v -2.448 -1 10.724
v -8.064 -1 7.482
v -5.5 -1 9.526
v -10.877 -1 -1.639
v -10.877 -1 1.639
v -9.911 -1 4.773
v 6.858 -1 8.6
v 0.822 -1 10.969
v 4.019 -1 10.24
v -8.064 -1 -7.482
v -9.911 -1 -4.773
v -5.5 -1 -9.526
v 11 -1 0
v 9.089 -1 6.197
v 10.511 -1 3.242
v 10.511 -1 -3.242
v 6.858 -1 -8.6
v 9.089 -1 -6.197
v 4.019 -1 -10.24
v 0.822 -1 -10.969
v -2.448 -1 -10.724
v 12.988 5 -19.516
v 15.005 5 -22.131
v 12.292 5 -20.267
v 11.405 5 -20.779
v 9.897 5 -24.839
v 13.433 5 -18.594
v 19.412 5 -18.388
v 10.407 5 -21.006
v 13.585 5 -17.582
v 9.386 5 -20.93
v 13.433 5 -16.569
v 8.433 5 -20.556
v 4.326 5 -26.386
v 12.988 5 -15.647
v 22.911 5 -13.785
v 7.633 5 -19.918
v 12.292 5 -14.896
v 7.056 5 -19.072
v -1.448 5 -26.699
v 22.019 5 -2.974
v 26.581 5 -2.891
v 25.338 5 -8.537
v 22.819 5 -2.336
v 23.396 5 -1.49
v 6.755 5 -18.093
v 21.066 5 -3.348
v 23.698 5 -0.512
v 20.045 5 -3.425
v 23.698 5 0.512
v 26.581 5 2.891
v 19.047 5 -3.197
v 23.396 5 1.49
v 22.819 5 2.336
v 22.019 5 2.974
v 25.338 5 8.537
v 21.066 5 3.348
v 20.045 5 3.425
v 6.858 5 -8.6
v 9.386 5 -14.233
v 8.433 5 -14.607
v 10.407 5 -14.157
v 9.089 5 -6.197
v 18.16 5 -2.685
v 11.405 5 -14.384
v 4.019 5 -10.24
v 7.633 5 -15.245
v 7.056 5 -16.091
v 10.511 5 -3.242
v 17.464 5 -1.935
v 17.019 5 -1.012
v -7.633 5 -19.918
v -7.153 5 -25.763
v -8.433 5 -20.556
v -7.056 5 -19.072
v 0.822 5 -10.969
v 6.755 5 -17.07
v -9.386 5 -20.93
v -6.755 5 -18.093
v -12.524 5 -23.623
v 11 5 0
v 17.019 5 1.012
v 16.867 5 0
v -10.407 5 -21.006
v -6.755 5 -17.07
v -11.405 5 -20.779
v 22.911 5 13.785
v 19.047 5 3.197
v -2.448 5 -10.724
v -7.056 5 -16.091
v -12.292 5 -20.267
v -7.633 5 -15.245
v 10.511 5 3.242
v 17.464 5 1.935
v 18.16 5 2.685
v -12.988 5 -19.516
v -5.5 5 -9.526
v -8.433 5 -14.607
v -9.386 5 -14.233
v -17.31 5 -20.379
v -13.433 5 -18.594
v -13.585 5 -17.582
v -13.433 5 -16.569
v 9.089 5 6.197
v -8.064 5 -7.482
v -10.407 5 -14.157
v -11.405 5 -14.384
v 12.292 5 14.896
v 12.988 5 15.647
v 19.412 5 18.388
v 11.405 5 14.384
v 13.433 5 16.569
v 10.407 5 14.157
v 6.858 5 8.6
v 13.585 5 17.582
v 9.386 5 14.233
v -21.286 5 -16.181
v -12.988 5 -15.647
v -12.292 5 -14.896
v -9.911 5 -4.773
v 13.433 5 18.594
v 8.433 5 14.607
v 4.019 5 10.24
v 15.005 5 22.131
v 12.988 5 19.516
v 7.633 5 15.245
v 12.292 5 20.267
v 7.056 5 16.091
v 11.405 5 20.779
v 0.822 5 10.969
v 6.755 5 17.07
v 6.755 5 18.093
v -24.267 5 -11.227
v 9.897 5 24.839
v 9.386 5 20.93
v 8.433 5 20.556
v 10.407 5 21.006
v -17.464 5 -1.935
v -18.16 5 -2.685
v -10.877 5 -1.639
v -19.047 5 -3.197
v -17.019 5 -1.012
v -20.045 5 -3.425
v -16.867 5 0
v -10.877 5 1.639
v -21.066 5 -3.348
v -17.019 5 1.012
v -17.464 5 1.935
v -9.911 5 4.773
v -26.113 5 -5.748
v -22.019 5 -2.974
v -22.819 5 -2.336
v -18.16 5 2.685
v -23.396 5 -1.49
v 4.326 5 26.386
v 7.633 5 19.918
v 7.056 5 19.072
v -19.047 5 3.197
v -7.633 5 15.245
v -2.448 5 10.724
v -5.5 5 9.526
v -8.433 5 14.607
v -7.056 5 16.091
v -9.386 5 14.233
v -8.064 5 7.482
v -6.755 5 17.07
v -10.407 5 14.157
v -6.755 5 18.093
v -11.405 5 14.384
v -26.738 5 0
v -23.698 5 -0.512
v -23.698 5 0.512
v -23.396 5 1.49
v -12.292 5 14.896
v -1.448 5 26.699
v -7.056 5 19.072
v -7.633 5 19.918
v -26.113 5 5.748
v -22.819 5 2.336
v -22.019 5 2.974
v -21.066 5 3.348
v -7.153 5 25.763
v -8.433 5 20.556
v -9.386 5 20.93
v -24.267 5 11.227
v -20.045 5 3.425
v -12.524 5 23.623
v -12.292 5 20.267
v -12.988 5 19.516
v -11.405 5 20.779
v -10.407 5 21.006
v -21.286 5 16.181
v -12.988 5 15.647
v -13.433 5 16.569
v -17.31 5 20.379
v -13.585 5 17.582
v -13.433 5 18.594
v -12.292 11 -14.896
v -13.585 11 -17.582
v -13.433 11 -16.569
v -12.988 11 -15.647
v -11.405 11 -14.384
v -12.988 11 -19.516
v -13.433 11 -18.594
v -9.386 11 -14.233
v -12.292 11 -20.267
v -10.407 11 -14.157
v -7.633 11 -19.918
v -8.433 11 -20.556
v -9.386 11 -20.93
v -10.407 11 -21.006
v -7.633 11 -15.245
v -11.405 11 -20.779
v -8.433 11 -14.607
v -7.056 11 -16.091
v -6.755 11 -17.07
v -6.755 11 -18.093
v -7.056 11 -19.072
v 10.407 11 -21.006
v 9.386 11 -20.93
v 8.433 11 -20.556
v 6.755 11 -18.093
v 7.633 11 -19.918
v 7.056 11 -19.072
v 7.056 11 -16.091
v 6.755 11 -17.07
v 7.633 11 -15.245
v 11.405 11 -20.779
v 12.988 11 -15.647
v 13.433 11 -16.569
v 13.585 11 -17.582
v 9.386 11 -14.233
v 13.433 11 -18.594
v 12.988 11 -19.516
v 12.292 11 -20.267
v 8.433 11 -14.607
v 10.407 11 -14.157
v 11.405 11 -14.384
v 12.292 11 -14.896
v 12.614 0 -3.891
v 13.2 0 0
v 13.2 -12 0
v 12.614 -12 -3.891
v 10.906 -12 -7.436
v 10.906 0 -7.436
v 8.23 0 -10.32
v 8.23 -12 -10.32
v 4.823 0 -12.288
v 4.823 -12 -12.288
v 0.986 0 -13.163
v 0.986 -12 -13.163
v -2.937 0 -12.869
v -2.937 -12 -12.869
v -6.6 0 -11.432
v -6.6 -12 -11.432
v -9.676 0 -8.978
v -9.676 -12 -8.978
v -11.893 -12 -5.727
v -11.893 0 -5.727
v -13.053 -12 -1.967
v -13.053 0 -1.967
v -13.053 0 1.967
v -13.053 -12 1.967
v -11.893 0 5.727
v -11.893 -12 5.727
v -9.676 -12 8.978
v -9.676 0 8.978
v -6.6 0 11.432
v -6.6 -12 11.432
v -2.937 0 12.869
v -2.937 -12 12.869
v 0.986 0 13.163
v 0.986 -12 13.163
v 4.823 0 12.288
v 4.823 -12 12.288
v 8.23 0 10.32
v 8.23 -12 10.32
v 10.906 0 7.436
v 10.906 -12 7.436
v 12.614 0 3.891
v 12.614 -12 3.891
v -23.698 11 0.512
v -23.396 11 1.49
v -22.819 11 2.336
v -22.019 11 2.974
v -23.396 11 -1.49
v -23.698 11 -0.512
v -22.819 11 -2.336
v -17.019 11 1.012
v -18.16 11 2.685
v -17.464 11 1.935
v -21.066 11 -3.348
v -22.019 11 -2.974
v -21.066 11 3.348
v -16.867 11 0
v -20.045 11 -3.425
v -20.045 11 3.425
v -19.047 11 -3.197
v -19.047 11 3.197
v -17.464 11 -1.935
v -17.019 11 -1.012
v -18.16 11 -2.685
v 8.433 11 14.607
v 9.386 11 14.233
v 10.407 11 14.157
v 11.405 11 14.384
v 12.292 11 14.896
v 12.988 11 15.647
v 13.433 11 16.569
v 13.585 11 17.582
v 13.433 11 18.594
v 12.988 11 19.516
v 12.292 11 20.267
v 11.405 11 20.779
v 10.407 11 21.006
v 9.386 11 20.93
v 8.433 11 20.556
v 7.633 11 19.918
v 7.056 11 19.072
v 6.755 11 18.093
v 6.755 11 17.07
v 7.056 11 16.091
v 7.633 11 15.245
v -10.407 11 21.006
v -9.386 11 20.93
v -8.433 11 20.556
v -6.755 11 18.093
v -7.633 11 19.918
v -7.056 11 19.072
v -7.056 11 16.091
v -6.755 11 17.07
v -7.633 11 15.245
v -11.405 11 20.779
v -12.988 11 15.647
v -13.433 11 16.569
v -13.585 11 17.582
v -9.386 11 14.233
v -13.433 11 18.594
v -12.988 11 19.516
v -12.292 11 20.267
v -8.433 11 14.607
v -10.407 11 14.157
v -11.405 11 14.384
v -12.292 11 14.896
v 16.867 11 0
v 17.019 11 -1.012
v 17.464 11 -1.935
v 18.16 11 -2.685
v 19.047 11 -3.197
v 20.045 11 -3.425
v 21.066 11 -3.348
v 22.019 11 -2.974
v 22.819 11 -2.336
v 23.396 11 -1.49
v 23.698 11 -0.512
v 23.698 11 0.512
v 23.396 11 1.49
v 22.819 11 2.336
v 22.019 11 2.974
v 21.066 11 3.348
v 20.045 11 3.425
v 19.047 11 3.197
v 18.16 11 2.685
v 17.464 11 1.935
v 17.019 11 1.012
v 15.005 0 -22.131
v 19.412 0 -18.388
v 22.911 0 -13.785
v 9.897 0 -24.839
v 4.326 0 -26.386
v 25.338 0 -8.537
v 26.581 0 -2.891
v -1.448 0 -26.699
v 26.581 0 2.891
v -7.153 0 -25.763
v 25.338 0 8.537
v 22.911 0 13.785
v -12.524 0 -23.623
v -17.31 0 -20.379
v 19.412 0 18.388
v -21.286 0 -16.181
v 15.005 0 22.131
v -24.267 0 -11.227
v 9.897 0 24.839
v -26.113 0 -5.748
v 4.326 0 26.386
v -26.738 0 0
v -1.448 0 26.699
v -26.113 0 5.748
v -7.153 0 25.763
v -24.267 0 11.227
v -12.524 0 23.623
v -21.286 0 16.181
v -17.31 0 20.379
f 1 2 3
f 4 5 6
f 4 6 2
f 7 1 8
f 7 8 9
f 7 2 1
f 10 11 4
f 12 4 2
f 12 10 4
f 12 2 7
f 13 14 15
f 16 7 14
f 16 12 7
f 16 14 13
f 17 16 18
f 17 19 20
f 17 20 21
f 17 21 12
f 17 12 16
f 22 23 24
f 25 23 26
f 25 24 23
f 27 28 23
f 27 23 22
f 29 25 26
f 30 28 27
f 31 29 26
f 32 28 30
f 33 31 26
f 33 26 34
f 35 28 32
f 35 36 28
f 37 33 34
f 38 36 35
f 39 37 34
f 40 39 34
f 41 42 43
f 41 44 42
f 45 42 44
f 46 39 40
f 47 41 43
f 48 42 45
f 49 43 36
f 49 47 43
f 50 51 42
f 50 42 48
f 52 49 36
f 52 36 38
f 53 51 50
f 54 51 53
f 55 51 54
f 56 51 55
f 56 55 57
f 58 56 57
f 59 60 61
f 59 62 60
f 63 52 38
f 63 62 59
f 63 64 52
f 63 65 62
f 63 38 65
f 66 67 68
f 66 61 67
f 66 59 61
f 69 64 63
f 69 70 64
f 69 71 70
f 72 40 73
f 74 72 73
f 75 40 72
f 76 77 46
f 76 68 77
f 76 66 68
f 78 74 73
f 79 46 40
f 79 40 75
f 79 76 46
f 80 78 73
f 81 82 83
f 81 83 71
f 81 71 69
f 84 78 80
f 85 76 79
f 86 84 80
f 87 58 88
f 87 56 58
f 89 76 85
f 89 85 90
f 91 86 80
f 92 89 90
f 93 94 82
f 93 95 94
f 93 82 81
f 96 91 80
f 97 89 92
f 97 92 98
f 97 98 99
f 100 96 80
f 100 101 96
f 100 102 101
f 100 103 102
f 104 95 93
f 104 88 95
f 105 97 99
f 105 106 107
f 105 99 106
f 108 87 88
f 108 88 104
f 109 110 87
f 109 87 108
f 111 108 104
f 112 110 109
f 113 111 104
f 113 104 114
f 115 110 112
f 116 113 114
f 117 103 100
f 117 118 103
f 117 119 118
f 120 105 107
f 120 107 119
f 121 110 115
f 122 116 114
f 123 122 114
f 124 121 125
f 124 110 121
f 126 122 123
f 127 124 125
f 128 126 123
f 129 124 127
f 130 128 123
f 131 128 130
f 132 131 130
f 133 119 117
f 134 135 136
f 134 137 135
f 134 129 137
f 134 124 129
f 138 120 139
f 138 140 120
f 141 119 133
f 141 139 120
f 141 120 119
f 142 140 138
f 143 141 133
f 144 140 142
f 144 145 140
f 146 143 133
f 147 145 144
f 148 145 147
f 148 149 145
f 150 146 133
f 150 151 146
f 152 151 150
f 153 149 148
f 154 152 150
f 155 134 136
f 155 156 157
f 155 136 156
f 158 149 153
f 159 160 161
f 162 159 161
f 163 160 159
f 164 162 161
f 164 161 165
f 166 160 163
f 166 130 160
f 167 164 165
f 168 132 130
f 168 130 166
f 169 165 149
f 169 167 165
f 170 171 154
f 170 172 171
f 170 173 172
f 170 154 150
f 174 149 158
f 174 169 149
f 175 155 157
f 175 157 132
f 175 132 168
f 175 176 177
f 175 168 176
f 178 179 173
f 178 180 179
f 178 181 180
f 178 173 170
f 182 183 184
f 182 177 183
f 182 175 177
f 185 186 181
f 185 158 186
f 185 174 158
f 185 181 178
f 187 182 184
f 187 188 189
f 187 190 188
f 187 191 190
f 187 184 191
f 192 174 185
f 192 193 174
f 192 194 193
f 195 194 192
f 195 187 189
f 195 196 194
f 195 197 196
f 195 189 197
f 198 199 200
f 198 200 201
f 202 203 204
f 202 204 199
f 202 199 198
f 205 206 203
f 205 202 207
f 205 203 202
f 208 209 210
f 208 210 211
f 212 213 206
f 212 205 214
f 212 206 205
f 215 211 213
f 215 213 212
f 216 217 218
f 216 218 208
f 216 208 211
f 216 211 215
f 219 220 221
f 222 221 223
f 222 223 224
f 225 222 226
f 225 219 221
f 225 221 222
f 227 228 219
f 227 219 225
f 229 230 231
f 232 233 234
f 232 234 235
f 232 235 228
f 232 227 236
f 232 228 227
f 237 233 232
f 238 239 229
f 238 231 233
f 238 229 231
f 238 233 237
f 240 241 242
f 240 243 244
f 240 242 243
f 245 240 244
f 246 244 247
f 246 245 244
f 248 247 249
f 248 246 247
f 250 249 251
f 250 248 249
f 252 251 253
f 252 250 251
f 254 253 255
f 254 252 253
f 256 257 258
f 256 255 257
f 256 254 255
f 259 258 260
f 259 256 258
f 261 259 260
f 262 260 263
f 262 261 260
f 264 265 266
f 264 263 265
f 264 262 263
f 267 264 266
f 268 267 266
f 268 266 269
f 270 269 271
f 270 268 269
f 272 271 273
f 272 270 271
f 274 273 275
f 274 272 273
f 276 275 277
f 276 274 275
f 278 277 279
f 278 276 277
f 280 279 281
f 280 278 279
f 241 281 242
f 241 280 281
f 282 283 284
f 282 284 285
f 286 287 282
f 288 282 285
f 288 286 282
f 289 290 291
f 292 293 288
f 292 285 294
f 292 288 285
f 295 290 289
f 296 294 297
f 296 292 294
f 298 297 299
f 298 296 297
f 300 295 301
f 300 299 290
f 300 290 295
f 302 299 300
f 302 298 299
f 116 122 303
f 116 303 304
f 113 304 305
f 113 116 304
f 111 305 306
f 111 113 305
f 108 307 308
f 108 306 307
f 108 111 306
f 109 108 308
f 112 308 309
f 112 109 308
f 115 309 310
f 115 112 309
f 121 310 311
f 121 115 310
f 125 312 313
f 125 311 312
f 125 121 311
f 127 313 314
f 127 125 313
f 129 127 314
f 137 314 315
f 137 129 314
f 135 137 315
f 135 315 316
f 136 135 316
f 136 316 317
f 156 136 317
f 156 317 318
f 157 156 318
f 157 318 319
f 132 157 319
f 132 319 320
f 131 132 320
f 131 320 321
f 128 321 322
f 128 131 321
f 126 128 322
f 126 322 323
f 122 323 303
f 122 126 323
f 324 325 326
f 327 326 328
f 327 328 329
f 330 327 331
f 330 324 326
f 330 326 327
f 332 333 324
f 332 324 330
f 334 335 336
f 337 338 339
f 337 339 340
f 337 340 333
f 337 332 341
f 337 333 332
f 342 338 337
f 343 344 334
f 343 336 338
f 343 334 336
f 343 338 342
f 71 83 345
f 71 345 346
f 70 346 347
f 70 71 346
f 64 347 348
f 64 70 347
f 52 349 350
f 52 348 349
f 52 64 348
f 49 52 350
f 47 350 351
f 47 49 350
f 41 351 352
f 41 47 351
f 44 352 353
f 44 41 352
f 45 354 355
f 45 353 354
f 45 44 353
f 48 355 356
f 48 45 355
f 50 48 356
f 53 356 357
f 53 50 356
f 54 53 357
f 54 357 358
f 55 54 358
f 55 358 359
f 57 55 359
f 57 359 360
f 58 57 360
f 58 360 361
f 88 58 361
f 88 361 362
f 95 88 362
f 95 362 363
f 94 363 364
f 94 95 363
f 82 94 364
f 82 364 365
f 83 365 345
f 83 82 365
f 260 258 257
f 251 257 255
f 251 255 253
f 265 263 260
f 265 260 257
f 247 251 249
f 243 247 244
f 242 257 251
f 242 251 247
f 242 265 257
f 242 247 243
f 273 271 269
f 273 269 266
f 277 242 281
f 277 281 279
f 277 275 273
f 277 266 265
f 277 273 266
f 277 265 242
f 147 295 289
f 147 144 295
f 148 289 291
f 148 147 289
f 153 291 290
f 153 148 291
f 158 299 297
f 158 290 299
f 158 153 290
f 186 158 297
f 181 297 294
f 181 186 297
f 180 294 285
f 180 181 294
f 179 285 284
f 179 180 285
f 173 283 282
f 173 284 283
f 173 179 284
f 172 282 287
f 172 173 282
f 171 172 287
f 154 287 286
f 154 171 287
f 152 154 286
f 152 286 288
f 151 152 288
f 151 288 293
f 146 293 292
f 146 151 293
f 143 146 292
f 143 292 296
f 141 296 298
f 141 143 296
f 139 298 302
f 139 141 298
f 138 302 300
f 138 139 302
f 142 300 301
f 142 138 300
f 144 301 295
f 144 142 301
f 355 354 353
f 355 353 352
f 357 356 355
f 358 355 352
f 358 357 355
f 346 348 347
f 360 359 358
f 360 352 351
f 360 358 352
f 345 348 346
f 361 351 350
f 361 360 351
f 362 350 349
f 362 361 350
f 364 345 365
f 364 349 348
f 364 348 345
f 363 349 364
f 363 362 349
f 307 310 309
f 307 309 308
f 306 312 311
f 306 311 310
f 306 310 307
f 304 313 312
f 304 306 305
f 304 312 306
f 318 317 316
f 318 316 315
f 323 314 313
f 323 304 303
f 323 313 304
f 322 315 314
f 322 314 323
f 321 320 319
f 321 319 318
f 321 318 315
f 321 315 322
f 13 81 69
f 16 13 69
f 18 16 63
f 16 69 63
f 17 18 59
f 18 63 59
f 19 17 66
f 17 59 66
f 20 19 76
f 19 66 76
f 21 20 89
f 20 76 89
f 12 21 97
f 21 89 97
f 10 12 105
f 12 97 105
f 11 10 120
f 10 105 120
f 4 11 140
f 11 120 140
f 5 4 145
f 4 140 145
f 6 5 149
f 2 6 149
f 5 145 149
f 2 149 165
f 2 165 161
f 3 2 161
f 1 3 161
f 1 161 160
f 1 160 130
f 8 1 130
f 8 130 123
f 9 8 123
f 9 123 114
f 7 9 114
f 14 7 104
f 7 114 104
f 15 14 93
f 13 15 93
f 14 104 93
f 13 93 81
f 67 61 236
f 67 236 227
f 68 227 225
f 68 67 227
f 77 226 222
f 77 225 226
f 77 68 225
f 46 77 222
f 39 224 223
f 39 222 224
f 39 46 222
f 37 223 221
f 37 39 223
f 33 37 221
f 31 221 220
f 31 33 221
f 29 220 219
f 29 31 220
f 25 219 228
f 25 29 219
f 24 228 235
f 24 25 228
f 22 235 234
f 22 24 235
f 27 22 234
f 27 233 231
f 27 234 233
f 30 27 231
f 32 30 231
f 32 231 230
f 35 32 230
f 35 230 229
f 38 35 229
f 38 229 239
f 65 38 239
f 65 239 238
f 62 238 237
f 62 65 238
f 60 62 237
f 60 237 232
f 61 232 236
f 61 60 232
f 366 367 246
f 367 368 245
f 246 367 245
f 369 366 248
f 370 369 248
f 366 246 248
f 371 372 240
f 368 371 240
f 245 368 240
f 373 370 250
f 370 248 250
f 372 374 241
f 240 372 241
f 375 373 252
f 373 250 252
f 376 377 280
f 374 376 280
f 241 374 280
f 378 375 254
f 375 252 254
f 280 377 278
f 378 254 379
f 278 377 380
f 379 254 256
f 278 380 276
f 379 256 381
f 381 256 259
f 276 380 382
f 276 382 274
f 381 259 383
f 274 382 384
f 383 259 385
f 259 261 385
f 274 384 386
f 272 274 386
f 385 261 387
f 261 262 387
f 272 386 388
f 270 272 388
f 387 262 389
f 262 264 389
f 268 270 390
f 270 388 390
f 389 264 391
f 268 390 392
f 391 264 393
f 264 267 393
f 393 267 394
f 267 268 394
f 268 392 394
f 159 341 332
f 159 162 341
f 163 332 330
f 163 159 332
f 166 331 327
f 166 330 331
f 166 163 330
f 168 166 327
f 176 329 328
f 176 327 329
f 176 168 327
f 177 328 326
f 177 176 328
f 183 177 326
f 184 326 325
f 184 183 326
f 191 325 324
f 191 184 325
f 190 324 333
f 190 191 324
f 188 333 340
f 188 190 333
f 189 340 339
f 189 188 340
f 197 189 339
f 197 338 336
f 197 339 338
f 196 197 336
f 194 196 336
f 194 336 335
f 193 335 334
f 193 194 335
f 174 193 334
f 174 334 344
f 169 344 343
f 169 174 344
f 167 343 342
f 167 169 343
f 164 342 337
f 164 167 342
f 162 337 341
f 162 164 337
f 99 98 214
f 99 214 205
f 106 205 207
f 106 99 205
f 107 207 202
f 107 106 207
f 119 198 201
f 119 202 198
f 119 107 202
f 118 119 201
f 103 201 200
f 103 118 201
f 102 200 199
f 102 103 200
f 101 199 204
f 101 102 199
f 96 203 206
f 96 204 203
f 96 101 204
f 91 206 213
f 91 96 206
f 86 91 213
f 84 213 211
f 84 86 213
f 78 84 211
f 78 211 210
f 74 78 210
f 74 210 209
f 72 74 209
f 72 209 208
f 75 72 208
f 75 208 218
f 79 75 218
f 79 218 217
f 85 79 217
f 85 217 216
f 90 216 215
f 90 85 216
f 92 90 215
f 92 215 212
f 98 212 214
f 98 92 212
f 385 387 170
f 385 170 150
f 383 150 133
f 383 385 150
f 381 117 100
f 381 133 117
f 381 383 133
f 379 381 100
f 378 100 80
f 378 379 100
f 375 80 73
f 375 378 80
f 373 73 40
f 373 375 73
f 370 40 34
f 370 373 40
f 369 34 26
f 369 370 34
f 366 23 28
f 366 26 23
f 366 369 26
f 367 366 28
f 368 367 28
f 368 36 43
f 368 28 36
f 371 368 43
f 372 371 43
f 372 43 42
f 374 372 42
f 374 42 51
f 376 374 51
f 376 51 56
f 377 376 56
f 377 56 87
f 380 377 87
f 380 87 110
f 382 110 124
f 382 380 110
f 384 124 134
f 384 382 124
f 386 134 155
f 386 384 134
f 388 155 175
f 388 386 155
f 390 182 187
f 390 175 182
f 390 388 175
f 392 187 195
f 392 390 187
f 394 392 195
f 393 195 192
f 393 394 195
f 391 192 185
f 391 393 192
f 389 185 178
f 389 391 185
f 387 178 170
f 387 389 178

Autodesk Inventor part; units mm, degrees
ref_plane "YZ Plane" through (0, 0, 0) normal (1, 0, 0) x (0, 1, 0)
ref_plane "XZ Plane" through (0, 0, 0) normal (0, 1, 0) x (-1, 0, 0)
ref_plane "XY Plane" through (0, 0, 0) normal (0, 0, 1) x (1, 0, 0)
sketch "Szkic1" plane through (0, 0, 0) normal (0, 1, 0) x (-1, 0, 0)
  circle A0 centre (0, 0) radius 26.738
  dimension "d0" = 26.738
extrude "Wyciągnięcie proste1" add sketch "Szkic1" along normal blind 5
sketch "Szkic2" plane through (0, 5, 0) normal (0, 1, 0) x (1, 0, 0)
  circle A0 centre (-1.4324, 0) radius 18.869 construction
  circle A1 centre (-20.3014, 0) radius 3.4345
  point P0 (0, 0)
  dimension "d5" = 3.4345
  dimension "d6" = 18.869
extrude "Wyciągnięcie proste2" add sketch "Szkic2" along normal blind 6
pattern_circular "Szyk kołowy1" count 6 over 360 about axis through (0, 0, 0) along (0, 1, 0) of "Wyciągnięcie proste2"
sketch "Szkic5" plane through (0, 0, 0) normal (0, -1, 0) x (1, 0, 0)
  point P0 (0, 0)
sketch "Szkic6" plane through (0, 0, 0) normal (0, -1, 0) x (1, 0, 0)
  circle A0 centre (0, 0) radius 13.2
  dimension "d17" = 13.2
extrude "Wyciągnięcie proste5" add sketch "Szkic6" along normal blind 12
sketch "Szkic7" plane through (0, 5, 0) normal (0, 1, 0) x (1, 0, 0)
  circle A0 centre (0, 0) radius 11
  dimension "d20" = 11
extrude "Wyciągnięcie proste6" cut sketch "Szkic7" against normal blind 6
equation "\"d0\" = R"
equation "\"d3\" = h2"
equation "\"d5\" = dwr1"
equation "\"d6\" = dwr2"
equation "\"d17\" = 1.2 * Lrz"
equation "\"d18\" = h2 + Lh"
equation "\"d20\" = Lrz"
equation "\"silnik_rw\" = 2.5"
equation "\"silnik_d_srub\" = 31"
equation "\"silnik_r_wypust\" = Lrz"
equation "\"Lrz\" = 11"
equation "\"Lh\" = 7"
equation "\"Lrw\" = 4"
equation "\"h2\" = 5"
equation "\"h1\" = 2"
equation "\"Rr\" = 2"
equation "\"E1\" = 1"
equation "\"dwr\" = R"
equation "\"dwr2\" = 0.5 * Lrz + 0.5 * R"
equation "\"dwr1\" = -0.25 * Rr + 0.25 * R - 0.25 * Lrz"
equation "\"R1\" = 5"
equation "\"korpus_rw\" = 36.5"
equation "\"R\" = 26.73803"
properties part number "Dysk_wy"
